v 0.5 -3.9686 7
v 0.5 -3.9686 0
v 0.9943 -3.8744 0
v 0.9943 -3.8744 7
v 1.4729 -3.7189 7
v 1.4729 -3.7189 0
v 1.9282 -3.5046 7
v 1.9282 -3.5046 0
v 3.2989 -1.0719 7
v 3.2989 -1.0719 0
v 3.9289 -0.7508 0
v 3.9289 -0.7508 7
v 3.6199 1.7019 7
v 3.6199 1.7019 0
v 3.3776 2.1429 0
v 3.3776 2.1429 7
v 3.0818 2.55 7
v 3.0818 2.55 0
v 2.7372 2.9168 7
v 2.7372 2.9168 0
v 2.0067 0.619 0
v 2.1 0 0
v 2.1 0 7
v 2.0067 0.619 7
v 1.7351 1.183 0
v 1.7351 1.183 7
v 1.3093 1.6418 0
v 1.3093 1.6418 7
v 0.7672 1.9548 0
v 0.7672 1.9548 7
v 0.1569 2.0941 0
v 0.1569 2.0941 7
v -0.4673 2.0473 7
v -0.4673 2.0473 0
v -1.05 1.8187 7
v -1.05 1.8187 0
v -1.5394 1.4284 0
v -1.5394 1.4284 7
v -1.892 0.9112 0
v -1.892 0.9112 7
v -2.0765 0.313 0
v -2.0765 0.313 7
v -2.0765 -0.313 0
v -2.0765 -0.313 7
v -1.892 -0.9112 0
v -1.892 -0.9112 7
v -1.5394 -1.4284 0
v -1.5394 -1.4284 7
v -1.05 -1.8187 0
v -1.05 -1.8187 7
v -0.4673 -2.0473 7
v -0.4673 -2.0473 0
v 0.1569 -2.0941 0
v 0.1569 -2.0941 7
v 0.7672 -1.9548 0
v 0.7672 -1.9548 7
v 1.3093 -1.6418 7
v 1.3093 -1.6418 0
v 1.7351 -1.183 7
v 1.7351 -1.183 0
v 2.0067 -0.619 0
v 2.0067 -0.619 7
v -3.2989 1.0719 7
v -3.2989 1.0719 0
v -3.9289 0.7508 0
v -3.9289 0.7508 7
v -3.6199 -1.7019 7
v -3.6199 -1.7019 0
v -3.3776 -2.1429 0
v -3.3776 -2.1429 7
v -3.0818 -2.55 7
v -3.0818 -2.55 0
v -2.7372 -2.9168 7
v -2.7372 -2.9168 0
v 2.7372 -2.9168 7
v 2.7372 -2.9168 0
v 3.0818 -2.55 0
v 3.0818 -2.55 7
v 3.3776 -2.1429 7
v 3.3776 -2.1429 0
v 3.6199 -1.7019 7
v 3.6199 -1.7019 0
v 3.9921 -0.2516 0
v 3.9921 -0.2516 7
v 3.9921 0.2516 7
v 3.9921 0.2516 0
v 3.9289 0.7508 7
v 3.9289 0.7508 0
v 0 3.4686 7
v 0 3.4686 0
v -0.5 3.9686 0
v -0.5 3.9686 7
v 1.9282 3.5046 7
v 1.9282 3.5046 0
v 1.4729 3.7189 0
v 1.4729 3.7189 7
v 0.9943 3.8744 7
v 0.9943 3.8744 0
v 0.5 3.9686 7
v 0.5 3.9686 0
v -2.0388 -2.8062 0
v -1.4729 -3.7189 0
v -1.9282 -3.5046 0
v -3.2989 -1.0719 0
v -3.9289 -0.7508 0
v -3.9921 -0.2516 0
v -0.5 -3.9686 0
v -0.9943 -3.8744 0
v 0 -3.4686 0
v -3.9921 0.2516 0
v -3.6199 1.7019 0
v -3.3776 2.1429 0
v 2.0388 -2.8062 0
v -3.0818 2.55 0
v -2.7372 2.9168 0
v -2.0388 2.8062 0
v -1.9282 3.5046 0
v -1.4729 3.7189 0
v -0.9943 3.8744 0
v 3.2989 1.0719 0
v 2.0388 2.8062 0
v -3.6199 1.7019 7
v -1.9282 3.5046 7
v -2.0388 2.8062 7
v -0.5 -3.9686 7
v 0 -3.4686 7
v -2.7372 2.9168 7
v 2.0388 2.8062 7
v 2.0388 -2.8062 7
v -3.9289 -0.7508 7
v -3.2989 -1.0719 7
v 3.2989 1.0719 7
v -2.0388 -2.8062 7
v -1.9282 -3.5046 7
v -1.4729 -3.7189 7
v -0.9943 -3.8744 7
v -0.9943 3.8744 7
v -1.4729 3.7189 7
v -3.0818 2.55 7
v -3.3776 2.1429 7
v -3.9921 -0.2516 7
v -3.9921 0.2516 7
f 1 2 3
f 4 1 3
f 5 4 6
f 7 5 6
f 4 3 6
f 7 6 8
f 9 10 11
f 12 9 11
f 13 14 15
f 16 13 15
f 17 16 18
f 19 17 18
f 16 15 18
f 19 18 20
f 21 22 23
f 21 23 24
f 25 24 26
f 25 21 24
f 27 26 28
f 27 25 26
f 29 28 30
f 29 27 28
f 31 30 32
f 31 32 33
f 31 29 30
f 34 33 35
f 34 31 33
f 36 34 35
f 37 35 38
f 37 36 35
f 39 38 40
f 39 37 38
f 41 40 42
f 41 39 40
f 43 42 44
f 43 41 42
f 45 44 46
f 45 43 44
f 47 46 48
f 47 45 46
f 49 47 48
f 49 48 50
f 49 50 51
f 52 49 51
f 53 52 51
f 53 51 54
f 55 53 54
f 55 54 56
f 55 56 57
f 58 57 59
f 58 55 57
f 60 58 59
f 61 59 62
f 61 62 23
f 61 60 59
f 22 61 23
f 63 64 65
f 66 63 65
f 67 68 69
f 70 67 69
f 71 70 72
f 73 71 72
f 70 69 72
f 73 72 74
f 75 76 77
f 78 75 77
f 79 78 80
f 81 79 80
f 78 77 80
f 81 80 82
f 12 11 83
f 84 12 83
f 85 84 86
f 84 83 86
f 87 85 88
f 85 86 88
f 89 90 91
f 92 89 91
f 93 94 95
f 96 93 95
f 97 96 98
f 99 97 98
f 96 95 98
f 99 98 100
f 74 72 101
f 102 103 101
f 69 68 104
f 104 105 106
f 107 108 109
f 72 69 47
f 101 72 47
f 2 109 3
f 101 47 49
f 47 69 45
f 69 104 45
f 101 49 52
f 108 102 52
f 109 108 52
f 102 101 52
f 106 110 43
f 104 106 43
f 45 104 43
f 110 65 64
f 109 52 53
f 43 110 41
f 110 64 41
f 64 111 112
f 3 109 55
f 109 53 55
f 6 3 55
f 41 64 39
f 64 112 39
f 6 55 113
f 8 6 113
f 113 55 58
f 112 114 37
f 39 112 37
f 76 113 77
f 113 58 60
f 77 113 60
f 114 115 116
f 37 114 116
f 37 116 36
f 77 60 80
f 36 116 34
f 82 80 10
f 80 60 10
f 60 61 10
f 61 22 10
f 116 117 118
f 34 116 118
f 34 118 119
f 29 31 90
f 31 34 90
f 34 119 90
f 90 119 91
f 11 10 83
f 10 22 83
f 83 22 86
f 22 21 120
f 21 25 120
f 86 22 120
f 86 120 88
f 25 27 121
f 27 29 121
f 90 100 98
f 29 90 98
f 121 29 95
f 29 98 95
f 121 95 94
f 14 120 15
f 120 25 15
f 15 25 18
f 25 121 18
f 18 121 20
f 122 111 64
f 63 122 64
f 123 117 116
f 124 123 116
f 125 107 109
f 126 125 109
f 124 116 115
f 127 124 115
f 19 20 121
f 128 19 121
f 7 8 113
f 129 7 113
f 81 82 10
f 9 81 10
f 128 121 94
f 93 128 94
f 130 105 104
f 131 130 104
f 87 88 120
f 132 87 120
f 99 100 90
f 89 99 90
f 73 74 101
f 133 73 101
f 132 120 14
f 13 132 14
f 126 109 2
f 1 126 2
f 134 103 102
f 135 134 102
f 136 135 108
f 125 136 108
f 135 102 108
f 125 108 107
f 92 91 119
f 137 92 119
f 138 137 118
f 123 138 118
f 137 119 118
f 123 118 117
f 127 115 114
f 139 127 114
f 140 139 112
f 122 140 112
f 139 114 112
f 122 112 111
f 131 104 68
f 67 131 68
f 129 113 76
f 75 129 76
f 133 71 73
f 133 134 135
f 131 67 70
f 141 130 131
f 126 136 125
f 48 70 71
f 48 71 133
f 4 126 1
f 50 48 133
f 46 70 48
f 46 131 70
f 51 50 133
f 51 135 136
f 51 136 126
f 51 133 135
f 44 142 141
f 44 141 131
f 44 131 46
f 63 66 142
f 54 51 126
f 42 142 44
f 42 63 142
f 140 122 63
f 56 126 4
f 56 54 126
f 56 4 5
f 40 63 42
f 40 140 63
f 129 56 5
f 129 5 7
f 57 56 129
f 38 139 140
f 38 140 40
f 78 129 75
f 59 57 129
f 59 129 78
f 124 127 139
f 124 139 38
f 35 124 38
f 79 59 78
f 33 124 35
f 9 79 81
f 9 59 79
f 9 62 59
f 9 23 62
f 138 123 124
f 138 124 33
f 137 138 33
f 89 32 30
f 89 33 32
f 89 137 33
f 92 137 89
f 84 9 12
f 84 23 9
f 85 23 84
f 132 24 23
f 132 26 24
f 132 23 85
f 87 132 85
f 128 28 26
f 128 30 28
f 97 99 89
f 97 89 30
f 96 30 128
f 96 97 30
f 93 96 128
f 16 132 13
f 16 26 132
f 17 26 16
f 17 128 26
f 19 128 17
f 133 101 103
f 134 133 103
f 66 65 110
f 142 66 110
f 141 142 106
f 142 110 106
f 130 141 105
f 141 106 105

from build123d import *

# Parameters (mm, degrees)
SKETCH1_R           = 2.1
BOSS_EXTRUDE1_DEPTH = 7


with BuildPart() as part:
    # Sketch1 → Boss-Extrude1 (new body)
    with BuildSketch(Plane.XY):
        with BuildLine():
            Line((0.5, 3.968626967), (0, 3.468626967))
            Line((0, 3.468626967), (-0.5, 3.968626967))
            ThreePointArc((-0.5, 3.968626967), (-1.236067977, 3.804226065), (-1.928191906, 3.504579286))
            Line((-1.928191906, 3.504579286), (-2.038807777, 2.806178163))
            Line((-2.038807777, 2.806178163), (-2.7372089, 2.916794034))
            ThreePointArc((-2.7372089, 2.916794034), (-3.236067977, 2.351141009), (-3.61988004, 1.701901435))
            Line((-3.61988004, 1.701901435), (-3.298860279, 1.07186468))
            Line((-3.298860279, 1.07186468), (-3.928897035, 0.750844919))
            ThreePointArc((-3.928897035, 0.750844919), (-4, 0), (-3.928897035, -0.750844919))
            Line((-3.928897035, -0.750844919), (-3.298860279, -1.07186468))
            Line((-3.298860279, -1.07186468), (-3.61988004, -1.701901435))
            ThreePointArc((-3.61988004, -1.701901435), (-3.236067977, -2.351141009), (-2.7372089, -2.916794034))
            Line((-2.7372089, -2.916794034), (-2.038807777, -2.806178163))
            Line((-2.038807777, -2.806178163), (-1.928191906, -3.504579286))
            ThreePointArc((-1.928191906, -3.504579286), (-1.236067977, -3.804226065), (-0.5, -3.968626967))
            Line((-0.5, -3.968626967), (0, -3.468626967))
            Line((0, -3.468626967), (0.5, -3.968626967))
            ThreePointArc((0.5, -3.968626967), (1.236067977, -3.804226065), (1.928191906, -3.504579286))
            Line((1.928191906, -3.504579286), (2.038807777, -2.806178163))
            Line((2.038807777, -2.806178163), (2.7372089, -2.916794034))
            ThreePointArc((2.7372089, -2.916794034), (3.236067977, -2.351141009), (3.61988004, -1.701901435))
            Line((3.61988004, -1.701901435), (3.298860279, -1.07186468))
            Line((3.298860279, -1.07186468), (3.928897035, -0.750844919))
            ThreePointArc((3.928897035, -0.750844919), (4, 0), (3.928897035, 0.750844919))
            Line((3.928897035, 0.750844919), (3.298860279, 1.07186468))
            Line((3.298860279, 1.07186468), (3.61988004, 1.701901435))
            ThreePointArc((3.61988004, 1.701901435), (3.236067977, 2.351141009), (2.7372089, 2.916794034))
            Line((2.7372089, 2.916794034), (2.038807777, 2.806178163))
            Line((2.038807777, 2.806178163), (1.928191906, 3.504579286))
            ThreePointArc((1.928191906, 3.504579286), (1.236067977, 3.804226065), (0.5, 3.968626967))
        make_face()
        Circle(SKETCH1_R, mode=Mode.SUBTRACT)
    extrude(amount=BOSS_EXTRUDE1_DEPTH)


solid = part.part
